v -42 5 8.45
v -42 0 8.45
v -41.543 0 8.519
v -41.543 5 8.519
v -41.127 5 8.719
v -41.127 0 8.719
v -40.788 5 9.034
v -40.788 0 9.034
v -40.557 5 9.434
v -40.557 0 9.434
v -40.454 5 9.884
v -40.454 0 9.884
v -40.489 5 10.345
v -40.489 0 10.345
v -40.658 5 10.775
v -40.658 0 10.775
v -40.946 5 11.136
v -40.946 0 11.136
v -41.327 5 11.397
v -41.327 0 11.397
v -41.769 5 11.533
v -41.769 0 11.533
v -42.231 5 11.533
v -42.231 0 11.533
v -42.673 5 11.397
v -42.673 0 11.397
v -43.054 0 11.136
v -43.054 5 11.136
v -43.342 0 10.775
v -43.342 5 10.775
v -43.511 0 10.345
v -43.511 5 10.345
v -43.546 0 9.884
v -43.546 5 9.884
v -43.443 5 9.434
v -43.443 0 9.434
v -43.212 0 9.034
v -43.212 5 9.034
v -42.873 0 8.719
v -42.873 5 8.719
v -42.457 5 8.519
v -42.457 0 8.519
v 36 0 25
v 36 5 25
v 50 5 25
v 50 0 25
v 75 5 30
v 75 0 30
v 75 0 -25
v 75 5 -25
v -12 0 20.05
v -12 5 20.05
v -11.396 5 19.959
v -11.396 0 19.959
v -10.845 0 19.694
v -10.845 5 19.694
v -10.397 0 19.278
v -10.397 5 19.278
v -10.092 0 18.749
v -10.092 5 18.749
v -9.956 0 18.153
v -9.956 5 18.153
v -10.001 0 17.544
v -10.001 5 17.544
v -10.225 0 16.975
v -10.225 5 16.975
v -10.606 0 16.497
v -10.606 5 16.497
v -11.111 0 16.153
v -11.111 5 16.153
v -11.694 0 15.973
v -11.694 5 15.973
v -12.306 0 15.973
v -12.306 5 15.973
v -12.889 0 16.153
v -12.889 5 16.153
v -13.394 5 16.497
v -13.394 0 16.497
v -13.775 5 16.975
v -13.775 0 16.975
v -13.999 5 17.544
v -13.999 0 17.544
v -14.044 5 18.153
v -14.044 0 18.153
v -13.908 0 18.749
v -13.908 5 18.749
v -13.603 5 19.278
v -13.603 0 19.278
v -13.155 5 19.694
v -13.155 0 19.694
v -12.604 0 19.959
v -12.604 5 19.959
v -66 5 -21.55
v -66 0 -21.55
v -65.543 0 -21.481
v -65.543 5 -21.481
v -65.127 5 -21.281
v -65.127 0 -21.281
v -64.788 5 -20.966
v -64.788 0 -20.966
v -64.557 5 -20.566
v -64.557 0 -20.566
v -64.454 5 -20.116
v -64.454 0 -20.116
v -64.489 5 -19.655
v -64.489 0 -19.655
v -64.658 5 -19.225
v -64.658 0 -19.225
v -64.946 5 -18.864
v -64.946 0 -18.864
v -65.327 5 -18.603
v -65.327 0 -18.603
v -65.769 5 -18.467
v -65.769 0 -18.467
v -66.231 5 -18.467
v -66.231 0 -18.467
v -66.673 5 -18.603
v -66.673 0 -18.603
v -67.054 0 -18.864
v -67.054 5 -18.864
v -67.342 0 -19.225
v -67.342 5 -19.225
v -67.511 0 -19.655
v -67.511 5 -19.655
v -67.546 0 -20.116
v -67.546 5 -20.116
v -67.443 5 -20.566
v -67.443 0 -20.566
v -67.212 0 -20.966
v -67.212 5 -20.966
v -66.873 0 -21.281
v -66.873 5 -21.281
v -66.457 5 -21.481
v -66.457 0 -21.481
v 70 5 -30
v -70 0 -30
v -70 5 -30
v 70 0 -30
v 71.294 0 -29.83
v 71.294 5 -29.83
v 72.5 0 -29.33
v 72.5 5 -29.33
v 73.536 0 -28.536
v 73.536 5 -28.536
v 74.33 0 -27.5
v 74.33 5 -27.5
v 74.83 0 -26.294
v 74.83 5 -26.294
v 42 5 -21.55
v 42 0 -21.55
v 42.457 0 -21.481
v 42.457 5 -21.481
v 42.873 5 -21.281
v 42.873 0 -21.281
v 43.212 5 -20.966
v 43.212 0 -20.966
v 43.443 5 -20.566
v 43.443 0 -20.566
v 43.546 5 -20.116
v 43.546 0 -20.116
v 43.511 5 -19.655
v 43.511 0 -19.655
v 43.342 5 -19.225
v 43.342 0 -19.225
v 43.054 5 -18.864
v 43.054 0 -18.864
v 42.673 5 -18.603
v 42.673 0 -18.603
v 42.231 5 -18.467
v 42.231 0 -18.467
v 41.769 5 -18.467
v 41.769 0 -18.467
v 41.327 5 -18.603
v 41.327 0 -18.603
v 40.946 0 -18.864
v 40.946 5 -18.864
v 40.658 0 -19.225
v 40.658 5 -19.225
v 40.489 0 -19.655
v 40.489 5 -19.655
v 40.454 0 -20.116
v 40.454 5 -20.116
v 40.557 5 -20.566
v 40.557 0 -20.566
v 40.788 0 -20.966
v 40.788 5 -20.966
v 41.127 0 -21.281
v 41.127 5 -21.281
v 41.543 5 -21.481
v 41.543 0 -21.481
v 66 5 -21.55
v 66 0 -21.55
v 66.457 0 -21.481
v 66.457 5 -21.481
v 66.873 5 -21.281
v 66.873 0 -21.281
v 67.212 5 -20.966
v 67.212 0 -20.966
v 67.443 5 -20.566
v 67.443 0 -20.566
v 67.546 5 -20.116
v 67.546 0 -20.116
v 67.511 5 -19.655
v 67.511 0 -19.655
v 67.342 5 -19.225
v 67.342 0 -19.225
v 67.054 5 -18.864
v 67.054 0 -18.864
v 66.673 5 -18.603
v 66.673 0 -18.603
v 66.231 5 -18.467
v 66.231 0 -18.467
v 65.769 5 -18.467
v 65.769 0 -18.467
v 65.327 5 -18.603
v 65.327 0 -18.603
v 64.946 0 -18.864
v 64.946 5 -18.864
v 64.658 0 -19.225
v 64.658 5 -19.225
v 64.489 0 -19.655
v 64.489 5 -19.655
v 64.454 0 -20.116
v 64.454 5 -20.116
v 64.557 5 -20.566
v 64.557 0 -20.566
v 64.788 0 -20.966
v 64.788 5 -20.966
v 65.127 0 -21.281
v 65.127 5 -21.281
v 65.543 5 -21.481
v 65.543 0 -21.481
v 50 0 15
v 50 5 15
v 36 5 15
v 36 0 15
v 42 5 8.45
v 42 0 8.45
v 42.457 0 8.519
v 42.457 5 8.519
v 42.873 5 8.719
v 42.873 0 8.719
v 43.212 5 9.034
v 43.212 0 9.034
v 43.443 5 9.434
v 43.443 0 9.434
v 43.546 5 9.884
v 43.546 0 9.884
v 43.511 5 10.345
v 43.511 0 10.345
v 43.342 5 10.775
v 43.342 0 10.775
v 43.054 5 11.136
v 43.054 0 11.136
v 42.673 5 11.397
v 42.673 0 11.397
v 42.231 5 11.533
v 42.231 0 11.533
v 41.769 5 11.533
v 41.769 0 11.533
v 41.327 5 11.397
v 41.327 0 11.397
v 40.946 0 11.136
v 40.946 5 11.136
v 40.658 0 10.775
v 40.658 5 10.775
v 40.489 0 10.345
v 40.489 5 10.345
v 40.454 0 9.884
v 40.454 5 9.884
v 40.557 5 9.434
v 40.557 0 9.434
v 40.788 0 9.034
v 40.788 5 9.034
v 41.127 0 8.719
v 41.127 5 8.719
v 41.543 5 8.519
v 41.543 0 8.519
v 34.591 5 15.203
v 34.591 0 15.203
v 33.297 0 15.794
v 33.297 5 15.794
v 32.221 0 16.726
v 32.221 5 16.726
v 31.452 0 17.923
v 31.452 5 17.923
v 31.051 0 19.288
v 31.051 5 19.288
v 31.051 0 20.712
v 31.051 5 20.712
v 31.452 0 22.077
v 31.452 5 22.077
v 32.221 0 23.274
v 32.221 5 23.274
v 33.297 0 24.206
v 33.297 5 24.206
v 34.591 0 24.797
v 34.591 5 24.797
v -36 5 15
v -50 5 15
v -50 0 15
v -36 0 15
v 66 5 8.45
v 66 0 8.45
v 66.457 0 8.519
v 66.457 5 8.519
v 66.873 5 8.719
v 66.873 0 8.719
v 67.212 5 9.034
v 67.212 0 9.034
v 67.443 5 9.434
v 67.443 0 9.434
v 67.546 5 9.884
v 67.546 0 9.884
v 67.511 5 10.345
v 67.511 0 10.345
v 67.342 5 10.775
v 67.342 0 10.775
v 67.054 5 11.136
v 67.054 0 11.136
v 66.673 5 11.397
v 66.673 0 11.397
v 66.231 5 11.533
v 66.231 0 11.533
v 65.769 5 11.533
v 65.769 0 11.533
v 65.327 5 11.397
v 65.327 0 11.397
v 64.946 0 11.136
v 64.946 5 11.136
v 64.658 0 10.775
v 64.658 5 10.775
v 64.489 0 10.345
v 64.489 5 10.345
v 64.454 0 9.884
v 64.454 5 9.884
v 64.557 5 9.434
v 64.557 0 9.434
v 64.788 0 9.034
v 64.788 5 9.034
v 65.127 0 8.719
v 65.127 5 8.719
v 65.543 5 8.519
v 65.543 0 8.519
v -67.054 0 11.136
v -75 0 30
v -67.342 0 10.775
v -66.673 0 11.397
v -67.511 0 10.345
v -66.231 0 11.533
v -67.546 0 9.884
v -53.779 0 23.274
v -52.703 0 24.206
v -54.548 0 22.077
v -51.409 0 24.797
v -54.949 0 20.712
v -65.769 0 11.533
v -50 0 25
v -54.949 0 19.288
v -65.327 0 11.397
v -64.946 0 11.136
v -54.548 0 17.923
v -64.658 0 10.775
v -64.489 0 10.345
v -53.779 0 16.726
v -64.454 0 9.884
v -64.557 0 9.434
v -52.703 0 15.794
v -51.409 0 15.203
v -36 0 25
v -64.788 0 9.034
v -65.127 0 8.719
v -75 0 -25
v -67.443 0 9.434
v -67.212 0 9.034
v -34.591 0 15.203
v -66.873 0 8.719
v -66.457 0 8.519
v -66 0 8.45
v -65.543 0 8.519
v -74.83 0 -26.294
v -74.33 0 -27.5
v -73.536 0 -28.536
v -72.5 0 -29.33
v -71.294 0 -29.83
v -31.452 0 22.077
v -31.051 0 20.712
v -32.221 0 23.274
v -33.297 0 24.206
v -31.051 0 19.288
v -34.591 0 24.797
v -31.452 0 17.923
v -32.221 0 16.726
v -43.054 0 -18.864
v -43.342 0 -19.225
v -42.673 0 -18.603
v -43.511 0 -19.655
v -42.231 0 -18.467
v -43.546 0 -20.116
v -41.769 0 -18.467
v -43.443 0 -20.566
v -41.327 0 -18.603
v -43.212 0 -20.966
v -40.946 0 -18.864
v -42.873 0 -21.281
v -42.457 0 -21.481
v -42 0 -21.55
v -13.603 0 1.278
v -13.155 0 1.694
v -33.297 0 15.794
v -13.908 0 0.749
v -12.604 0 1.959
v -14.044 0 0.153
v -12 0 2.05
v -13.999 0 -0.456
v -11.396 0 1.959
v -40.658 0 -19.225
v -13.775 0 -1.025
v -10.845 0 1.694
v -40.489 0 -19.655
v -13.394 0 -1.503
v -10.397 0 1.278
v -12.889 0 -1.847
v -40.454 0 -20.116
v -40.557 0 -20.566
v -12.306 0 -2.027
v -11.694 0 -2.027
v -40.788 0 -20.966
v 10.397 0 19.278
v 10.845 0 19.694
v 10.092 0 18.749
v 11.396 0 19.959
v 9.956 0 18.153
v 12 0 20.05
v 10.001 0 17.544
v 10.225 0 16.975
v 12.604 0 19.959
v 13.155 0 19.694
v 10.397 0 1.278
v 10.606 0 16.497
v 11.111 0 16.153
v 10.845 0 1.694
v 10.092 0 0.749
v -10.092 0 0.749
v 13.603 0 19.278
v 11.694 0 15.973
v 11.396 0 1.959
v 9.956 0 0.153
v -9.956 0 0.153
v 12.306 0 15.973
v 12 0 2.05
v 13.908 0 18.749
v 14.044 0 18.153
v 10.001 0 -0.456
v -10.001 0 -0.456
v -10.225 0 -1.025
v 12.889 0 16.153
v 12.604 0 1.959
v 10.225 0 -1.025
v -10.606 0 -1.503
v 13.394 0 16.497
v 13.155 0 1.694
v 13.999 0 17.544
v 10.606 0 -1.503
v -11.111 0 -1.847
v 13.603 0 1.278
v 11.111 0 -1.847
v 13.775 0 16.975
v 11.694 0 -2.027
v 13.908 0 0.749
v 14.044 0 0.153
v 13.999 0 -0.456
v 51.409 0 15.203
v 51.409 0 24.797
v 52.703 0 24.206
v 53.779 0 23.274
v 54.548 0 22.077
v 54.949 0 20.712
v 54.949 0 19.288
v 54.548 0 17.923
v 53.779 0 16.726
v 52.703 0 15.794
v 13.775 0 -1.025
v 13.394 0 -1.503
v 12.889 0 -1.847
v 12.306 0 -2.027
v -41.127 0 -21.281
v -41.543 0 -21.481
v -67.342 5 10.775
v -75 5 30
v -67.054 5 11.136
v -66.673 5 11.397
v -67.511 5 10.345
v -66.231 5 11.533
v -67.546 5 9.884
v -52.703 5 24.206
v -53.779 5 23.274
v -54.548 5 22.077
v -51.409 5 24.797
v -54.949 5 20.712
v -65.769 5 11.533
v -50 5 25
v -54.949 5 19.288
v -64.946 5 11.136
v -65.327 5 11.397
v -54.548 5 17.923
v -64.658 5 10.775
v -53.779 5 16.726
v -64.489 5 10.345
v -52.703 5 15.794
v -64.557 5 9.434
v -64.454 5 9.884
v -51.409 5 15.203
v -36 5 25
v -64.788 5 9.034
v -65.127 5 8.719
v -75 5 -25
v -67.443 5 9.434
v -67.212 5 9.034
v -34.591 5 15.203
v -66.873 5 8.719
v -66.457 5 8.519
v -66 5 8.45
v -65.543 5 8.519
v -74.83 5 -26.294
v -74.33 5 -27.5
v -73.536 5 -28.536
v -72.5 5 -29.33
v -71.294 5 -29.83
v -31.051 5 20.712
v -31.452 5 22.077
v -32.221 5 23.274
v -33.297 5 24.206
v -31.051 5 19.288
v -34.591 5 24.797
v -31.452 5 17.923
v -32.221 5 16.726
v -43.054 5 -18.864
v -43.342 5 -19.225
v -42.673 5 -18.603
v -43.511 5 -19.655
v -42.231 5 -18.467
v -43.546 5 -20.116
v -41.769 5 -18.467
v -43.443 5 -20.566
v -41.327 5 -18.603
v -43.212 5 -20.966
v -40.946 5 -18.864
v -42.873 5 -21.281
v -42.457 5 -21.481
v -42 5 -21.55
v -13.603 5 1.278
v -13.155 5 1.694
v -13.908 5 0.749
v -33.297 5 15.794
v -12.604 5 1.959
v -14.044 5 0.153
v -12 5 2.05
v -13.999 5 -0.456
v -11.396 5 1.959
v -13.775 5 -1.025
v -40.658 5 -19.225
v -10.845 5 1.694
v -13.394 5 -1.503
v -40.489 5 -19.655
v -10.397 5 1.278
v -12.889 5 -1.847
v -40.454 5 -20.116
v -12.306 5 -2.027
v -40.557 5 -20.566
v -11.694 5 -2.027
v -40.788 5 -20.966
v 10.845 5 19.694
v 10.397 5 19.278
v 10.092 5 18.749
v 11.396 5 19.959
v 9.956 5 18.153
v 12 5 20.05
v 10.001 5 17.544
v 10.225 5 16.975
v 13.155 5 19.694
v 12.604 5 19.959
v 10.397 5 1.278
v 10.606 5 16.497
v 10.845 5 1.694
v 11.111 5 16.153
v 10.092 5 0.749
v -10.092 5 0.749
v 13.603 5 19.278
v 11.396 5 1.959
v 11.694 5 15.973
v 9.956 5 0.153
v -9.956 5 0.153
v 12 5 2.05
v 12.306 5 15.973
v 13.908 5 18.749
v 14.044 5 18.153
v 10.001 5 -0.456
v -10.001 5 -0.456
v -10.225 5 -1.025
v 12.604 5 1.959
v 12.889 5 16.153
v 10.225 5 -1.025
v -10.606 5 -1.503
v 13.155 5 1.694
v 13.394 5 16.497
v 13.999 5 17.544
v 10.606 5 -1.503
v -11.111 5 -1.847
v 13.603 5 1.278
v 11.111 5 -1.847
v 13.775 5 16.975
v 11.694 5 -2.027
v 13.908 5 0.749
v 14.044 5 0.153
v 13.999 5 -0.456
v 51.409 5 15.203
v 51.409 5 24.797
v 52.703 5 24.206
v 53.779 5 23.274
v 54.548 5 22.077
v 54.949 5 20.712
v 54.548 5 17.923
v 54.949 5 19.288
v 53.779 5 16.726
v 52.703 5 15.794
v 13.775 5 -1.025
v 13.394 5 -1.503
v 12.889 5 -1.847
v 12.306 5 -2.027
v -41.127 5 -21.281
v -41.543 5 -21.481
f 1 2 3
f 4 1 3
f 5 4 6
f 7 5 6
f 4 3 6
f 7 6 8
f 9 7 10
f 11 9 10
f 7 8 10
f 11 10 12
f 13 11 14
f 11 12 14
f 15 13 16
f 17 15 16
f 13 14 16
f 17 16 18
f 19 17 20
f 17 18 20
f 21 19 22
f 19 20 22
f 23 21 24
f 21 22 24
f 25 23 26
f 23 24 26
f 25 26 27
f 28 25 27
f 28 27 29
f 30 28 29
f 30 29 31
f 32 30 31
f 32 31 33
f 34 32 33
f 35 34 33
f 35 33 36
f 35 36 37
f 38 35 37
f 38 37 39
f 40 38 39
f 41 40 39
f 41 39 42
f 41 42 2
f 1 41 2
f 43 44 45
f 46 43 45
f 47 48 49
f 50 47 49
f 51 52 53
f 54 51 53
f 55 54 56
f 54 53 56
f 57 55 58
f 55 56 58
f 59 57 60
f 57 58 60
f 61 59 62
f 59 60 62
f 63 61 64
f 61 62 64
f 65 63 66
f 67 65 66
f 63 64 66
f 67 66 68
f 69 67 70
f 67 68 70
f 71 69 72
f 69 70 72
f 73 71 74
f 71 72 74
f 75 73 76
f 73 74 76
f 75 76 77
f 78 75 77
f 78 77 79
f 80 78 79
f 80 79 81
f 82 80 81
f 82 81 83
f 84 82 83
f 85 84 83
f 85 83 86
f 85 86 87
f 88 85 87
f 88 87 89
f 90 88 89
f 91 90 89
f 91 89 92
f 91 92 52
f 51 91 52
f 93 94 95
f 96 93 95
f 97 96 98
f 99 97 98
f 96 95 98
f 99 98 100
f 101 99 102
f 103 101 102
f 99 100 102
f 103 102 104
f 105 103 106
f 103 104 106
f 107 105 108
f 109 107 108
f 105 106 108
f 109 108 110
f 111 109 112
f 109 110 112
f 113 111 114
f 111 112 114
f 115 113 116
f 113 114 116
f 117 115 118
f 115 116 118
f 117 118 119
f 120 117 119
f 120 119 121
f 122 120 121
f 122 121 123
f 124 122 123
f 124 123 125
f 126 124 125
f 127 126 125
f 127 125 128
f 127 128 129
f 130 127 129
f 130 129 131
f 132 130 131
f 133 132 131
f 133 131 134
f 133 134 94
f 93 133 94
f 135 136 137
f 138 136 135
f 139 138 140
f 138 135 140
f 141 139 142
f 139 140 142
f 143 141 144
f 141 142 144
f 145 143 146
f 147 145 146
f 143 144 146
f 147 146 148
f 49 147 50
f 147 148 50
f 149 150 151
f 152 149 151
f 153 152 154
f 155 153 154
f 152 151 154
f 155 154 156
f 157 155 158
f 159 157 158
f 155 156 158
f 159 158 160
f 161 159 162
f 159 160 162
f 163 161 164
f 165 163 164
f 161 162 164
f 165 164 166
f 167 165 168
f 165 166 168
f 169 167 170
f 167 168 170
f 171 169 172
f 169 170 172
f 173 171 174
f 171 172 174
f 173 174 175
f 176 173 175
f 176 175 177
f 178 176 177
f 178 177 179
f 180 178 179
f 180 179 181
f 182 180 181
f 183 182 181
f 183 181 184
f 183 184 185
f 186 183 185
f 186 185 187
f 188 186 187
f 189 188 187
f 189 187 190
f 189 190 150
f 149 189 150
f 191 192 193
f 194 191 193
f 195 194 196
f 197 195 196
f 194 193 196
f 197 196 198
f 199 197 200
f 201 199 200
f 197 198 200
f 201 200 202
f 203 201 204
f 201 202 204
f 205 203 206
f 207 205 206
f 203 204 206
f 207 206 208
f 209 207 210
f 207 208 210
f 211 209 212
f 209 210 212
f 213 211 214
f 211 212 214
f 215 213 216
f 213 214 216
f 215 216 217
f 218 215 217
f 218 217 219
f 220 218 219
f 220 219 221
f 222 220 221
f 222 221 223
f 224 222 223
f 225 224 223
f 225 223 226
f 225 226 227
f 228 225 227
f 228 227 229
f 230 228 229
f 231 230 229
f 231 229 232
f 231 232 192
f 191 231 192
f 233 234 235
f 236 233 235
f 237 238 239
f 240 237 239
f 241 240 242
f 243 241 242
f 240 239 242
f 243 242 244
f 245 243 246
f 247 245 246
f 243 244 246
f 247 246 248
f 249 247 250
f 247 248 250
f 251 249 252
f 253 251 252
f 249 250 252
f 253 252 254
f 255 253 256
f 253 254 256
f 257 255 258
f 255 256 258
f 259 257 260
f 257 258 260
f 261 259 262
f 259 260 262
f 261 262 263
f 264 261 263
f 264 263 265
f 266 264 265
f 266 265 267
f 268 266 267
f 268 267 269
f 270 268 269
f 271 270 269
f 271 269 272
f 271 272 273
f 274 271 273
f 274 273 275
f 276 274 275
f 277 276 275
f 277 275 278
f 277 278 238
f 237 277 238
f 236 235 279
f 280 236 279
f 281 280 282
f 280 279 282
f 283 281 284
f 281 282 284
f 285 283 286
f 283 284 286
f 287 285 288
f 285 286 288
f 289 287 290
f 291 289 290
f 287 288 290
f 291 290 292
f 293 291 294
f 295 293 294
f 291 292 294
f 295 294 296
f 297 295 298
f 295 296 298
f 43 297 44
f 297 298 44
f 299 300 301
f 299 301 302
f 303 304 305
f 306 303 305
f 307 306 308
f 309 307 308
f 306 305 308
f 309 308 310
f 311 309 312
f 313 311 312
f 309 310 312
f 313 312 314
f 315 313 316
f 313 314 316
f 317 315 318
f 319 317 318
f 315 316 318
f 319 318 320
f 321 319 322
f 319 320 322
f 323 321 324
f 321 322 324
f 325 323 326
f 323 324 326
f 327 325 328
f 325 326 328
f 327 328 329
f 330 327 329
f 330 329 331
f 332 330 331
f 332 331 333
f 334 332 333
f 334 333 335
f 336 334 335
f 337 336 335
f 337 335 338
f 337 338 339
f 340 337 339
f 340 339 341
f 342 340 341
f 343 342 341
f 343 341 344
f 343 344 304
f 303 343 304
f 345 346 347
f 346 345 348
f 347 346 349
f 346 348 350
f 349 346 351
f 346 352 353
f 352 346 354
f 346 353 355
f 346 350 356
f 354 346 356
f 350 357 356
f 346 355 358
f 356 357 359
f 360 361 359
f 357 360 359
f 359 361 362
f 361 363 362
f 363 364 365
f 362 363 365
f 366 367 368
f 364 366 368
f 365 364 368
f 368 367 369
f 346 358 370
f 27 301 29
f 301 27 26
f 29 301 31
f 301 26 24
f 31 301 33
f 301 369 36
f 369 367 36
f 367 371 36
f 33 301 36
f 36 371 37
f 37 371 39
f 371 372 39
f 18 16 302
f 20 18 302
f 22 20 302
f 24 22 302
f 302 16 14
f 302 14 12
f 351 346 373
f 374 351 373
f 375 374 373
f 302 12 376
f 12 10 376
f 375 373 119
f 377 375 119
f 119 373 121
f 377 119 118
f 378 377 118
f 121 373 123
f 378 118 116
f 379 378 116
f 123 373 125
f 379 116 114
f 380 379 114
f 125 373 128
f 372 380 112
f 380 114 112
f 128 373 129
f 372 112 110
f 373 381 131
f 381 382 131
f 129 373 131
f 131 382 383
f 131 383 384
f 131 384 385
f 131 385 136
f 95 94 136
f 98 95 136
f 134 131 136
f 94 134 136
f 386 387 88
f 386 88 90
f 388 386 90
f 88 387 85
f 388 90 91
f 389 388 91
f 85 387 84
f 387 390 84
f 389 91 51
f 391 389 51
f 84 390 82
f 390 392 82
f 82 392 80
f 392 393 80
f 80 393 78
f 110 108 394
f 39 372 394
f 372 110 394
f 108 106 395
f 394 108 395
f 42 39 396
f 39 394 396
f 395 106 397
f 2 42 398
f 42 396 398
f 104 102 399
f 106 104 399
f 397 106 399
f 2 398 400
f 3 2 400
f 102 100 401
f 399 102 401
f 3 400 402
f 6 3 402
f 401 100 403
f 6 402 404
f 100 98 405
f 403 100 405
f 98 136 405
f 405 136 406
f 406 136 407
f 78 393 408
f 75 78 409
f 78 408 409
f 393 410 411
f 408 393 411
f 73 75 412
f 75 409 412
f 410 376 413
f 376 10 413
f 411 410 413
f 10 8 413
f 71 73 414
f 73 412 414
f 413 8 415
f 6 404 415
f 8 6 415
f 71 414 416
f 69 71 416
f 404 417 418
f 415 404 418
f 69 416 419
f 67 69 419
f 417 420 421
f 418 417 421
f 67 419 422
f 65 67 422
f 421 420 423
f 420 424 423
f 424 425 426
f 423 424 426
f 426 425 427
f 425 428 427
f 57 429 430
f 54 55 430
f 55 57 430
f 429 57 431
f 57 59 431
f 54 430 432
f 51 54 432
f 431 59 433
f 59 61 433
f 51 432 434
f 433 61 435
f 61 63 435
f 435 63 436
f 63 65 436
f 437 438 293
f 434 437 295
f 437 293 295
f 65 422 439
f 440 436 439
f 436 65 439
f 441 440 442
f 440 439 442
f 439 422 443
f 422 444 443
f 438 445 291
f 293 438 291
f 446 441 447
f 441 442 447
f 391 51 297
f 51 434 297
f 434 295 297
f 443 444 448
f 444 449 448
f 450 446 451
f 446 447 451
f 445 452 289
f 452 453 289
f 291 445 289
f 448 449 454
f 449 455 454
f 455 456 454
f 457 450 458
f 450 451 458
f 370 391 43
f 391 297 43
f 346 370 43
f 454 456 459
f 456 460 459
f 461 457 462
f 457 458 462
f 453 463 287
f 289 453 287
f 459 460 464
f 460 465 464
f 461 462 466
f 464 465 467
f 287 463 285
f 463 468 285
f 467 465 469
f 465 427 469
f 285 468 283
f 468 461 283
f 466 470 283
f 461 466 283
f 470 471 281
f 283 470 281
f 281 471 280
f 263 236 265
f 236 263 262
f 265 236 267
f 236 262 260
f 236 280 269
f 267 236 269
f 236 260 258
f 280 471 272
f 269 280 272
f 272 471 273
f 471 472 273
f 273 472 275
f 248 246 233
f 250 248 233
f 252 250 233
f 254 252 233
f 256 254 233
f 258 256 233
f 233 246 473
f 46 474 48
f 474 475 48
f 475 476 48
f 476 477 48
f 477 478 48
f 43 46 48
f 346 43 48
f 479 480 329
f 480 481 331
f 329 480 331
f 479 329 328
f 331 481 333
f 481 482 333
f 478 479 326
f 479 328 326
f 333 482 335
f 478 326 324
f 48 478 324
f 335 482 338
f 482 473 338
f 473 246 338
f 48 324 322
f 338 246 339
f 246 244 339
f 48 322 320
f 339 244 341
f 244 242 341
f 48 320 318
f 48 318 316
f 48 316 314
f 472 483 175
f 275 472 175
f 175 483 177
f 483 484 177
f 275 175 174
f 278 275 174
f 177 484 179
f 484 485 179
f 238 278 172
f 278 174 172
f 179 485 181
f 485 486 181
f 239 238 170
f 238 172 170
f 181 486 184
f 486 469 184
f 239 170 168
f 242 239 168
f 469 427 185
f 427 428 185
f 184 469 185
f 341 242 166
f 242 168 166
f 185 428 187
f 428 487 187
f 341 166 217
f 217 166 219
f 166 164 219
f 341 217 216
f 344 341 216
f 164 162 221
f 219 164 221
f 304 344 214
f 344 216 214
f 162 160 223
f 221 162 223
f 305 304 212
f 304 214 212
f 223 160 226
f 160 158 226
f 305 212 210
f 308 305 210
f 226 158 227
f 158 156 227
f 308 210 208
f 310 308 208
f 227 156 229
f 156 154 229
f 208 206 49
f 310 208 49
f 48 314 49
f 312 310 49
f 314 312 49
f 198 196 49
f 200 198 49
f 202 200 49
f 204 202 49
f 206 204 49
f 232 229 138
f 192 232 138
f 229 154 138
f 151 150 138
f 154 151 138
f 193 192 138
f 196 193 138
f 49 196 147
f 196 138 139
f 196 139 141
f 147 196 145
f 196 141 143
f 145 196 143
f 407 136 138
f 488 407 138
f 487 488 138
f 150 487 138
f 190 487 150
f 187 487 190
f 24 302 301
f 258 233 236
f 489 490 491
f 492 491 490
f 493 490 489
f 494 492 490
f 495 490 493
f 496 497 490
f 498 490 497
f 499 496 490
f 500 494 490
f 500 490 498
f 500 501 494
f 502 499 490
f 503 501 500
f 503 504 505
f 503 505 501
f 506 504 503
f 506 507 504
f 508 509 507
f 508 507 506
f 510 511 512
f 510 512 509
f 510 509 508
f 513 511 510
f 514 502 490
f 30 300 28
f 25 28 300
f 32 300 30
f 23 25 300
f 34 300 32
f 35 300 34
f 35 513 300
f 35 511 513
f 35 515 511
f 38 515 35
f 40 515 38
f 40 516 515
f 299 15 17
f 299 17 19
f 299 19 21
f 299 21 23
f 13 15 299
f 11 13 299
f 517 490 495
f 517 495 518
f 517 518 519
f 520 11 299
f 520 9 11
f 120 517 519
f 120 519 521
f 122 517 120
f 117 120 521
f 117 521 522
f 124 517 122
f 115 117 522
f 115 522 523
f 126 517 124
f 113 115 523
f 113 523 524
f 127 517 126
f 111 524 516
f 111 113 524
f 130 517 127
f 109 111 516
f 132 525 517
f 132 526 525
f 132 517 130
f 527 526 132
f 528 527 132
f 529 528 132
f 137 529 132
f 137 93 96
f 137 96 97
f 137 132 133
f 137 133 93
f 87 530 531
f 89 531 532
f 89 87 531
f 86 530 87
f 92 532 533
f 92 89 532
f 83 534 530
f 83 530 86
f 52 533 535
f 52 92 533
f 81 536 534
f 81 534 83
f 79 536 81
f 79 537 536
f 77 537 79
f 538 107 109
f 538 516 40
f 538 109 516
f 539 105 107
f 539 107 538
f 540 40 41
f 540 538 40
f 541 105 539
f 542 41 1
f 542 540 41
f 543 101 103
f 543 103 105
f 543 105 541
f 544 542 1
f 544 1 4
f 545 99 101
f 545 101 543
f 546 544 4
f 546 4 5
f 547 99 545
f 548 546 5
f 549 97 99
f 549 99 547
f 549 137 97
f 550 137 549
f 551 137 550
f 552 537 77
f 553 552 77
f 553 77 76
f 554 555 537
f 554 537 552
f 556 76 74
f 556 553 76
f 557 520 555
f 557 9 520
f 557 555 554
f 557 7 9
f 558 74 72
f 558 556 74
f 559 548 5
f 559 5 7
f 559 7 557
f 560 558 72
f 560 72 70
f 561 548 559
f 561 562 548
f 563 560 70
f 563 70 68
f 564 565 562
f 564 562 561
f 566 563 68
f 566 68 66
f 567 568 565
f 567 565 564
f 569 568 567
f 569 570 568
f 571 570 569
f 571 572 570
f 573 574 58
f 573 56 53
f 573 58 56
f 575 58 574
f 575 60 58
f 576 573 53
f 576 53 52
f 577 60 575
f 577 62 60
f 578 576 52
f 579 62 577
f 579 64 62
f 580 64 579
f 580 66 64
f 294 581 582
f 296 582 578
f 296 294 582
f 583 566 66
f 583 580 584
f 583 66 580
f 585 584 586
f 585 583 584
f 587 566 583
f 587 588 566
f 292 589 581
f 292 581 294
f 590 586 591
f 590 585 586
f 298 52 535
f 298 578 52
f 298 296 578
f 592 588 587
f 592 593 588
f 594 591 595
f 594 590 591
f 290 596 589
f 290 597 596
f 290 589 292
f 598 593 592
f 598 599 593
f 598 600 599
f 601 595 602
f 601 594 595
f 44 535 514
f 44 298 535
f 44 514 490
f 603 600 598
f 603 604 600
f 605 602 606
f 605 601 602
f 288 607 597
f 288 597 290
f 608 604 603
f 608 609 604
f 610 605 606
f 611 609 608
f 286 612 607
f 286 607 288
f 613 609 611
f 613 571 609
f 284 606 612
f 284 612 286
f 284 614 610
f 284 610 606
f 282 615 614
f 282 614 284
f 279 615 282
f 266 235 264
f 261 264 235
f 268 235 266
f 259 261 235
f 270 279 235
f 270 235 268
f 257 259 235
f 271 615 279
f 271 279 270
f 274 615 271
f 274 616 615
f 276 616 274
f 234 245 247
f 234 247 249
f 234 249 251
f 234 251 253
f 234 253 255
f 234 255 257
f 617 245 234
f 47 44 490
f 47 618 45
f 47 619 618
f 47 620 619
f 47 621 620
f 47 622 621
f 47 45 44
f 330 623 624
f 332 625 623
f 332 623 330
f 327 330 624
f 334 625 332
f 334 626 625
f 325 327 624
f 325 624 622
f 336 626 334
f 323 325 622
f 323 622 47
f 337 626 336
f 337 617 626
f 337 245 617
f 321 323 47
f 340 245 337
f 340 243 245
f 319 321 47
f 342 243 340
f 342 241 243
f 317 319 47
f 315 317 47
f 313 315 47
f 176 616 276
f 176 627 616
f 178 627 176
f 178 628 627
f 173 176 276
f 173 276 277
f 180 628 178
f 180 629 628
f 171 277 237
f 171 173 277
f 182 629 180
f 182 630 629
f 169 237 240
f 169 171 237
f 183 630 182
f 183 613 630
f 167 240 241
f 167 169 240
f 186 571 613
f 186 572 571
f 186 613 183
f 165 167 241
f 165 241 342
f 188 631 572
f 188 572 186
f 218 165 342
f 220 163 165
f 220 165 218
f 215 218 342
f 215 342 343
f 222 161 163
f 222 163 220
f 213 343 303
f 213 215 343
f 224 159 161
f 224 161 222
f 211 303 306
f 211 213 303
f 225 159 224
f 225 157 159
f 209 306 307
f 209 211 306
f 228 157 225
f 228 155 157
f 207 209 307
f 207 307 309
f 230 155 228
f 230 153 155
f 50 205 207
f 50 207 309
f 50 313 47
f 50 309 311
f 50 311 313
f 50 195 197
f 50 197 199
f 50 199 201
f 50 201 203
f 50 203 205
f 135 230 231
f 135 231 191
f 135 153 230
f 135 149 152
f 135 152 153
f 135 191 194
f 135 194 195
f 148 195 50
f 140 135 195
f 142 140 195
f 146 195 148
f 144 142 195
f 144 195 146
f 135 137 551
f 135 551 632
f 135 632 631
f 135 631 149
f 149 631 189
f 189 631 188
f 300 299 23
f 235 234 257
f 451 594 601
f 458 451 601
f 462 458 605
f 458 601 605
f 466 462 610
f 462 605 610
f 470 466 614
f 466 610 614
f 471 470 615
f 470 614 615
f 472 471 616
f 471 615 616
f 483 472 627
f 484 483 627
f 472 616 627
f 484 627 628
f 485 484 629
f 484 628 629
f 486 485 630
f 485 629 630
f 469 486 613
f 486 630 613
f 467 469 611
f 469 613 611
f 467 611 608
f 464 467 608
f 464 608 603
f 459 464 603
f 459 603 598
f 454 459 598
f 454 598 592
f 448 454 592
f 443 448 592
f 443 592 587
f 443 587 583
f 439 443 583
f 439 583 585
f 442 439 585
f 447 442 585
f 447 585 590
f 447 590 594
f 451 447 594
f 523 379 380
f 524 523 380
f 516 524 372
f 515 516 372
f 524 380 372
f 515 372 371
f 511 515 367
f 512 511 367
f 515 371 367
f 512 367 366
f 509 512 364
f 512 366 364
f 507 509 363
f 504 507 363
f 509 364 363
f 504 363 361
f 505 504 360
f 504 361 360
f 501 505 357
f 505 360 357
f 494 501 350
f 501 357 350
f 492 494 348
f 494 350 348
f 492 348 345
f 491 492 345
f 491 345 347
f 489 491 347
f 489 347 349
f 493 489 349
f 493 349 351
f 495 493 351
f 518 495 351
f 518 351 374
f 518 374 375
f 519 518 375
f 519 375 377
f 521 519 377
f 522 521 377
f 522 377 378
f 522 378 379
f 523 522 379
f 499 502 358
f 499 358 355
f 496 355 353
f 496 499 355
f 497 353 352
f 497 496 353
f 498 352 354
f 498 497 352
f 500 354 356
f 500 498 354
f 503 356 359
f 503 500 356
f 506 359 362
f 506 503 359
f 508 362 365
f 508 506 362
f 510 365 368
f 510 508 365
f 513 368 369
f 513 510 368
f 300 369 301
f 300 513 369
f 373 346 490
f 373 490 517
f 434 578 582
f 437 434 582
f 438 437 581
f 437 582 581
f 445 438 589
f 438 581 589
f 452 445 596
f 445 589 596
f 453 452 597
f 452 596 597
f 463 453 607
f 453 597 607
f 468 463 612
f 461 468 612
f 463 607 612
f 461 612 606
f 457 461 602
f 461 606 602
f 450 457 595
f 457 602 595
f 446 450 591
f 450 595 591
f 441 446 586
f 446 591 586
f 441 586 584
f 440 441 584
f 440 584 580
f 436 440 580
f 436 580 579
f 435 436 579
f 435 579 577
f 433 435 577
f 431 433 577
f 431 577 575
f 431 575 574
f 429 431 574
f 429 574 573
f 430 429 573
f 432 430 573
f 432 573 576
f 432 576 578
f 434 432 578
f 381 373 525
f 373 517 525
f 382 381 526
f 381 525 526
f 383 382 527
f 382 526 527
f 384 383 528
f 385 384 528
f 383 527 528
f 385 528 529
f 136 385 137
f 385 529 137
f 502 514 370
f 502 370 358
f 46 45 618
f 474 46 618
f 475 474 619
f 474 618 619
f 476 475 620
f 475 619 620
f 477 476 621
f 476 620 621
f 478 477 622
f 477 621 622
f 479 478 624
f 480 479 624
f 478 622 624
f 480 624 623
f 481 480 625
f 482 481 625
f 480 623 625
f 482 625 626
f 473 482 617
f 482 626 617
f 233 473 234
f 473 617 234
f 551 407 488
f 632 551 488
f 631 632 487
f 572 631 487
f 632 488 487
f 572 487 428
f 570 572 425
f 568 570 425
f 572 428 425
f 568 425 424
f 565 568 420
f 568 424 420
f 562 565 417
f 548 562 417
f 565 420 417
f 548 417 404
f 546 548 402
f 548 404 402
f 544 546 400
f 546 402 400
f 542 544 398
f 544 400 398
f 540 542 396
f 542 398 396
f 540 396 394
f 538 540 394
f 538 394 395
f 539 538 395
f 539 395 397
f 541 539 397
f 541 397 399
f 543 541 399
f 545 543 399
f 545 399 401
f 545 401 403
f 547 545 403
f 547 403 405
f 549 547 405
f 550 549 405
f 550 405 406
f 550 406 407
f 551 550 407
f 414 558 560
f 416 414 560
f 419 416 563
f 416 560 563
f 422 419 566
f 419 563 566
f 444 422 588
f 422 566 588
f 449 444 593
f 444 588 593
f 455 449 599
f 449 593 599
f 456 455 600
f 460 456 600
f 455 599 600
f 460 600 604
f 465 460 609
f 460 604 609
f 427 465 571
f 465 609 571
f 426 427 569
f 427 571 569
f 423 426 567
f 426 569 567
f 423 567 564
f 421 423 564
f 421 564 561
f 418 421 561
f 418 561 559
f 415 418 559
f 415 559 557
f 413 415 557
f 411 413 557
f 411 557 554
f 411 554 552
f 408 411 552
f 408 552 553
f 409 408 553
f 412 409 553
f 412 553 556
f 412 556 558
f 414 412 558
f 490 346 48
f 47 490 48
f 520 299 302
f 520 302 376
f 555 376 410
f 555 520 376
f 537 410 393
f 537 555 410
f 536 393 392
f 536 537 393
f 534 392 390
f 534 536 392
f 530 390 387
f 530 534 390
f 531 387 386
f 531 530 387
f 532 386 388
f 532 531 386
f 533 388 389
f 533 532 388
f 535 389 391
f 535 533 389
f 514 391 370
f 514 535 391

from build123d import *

# Parameters (mm, degrees)
SKETCH_1_W          = 150
SKETCH_1_H          = 60
EXTRUDE_1_DEPTH     = 5
SKETCH_2_R          = 1.55
CUT_EXTRUDE_1_DEPTH = 10
SKETCH_3_R          = 2.05
CUT_EXTRUDE_2_DEPTH = 81.932070281
FILLET_1_R          = 5
CUT_EXTRUDE_3_DEPTH = 10


with BuildPart() as part:
    # 草图1 → 凸台-拉伸1 (new body)
    with BuildSketch(Plane(origin=(0, 0, 0), x_dir=(1, 0, 0), z_dir=(0, 1, 0))):
        Rectangle(SKETCH_1_W, SKETCH_1_H)
    extrude(amount=EXTRUDE_1_DEPTH)

    # 草图2 → 切除-拉伸1 (cut)
    with BuildSketch(Plane(origin=(0, 0, 0), x_dir=(-1, 0, 0), z_dir=(0, -1, 0))):
        with Locations(Location((-66, 20, 0), (0, 0, 90))):
            Circle(SKETCH_2_R)
        with Locations(Location((-42, 20, 0), (0, 0, 90))):
            Circle(SKETCH_2_R)
        with Locations(Location((-66, -10, 0), (0, 0, 90))):
            Circle(SKETCH_2_R)
        with Locations(Location((-42, -10, 0), (0, 0, 90))):
            Circle(SKETCH_2_R)
        with Locations(Location((42, 20, 0), (0, 0, 90))):
            Circle(SKETCH_2_R)
        with Locations(Location((66, 20, 0), (0, 0, 90))):
            Circle(SKETCH_2_R)
        with Locations(Location((42, -10, 0), (0, 0, 90))):
            Circle(SKETCH_2_R)
        with Locations(Location((66, -10, 0), (0, 0, 90))):
            Circle(SKETCH_2_R)
    extrude(amount=-CUT_EXTRUDE_1_DEPTH, mode=Mode.SUBTRACT)

    # 草图3 → 切除-拉伸2 (cut, through all)
    with BuildSketch(Plane(origin=(0, 5, 0), x_dir=(1, 0, 0), z_dir=(0, 1, 0))):
        with Locations(Location((-12, 0, 0), (0, 0, 270))):
            Circle(SKETCH_3_R)
        with Locations(Location((12, 0, 0), (0, 0, 270))):
            Circle(SKETCH_3_R)
        with Locations(Location((-12, -18, 0), (0, 0, 270))):
            Circle(SKETCH_3_R)
        with Locations(Location((12, -18, 0), (0, 0, 270))):
            Circle(SKETCH_3_R)
    extrude(amount=-CUT_EXTRUDE_2_DEPTH, mode=Mode.SUBTRACT)

    # 圆角1
    fillet_1_edges = [part.edges().sort_by_distance(p)[0] for p in [
        (-75, 2.5, -30),
        (75, 2.5, -30),
    ]]
    fillet(fillet_1_edges, radius=FILLET_1_R)

    # 草图4 → 切除-拉伸3 (cut)
    with BuildSketch(Plane(origin=(0, 5, 0), x_dir=(1, 0, 0), z_dir=(0, 1, 0))):
        with BuildLine():
            Line((-50, -15), (-36, -15))
            ThreePointArc((-36, -15), (-31, -20), (-36, -25))
            Line((-36, -25), (-50, -25))
            ThreePointArc((-50, -25), (-55, -20), (-50, -15))
        make_face()
        with BuildLine():
            Line((50, -15), (36, -15))
            ThreePointArc((36, -15), (31, -20), (36, -25))
            Line((36, -25), (50, -25))
            ThreePointArc((50, -25), (55, -20), (50, -15))
        make_face()
    extrude(amount=-CUT_EXTRUDE_3_DEPTH, mode=Mode.SUBTRACT)


solid = part.part
